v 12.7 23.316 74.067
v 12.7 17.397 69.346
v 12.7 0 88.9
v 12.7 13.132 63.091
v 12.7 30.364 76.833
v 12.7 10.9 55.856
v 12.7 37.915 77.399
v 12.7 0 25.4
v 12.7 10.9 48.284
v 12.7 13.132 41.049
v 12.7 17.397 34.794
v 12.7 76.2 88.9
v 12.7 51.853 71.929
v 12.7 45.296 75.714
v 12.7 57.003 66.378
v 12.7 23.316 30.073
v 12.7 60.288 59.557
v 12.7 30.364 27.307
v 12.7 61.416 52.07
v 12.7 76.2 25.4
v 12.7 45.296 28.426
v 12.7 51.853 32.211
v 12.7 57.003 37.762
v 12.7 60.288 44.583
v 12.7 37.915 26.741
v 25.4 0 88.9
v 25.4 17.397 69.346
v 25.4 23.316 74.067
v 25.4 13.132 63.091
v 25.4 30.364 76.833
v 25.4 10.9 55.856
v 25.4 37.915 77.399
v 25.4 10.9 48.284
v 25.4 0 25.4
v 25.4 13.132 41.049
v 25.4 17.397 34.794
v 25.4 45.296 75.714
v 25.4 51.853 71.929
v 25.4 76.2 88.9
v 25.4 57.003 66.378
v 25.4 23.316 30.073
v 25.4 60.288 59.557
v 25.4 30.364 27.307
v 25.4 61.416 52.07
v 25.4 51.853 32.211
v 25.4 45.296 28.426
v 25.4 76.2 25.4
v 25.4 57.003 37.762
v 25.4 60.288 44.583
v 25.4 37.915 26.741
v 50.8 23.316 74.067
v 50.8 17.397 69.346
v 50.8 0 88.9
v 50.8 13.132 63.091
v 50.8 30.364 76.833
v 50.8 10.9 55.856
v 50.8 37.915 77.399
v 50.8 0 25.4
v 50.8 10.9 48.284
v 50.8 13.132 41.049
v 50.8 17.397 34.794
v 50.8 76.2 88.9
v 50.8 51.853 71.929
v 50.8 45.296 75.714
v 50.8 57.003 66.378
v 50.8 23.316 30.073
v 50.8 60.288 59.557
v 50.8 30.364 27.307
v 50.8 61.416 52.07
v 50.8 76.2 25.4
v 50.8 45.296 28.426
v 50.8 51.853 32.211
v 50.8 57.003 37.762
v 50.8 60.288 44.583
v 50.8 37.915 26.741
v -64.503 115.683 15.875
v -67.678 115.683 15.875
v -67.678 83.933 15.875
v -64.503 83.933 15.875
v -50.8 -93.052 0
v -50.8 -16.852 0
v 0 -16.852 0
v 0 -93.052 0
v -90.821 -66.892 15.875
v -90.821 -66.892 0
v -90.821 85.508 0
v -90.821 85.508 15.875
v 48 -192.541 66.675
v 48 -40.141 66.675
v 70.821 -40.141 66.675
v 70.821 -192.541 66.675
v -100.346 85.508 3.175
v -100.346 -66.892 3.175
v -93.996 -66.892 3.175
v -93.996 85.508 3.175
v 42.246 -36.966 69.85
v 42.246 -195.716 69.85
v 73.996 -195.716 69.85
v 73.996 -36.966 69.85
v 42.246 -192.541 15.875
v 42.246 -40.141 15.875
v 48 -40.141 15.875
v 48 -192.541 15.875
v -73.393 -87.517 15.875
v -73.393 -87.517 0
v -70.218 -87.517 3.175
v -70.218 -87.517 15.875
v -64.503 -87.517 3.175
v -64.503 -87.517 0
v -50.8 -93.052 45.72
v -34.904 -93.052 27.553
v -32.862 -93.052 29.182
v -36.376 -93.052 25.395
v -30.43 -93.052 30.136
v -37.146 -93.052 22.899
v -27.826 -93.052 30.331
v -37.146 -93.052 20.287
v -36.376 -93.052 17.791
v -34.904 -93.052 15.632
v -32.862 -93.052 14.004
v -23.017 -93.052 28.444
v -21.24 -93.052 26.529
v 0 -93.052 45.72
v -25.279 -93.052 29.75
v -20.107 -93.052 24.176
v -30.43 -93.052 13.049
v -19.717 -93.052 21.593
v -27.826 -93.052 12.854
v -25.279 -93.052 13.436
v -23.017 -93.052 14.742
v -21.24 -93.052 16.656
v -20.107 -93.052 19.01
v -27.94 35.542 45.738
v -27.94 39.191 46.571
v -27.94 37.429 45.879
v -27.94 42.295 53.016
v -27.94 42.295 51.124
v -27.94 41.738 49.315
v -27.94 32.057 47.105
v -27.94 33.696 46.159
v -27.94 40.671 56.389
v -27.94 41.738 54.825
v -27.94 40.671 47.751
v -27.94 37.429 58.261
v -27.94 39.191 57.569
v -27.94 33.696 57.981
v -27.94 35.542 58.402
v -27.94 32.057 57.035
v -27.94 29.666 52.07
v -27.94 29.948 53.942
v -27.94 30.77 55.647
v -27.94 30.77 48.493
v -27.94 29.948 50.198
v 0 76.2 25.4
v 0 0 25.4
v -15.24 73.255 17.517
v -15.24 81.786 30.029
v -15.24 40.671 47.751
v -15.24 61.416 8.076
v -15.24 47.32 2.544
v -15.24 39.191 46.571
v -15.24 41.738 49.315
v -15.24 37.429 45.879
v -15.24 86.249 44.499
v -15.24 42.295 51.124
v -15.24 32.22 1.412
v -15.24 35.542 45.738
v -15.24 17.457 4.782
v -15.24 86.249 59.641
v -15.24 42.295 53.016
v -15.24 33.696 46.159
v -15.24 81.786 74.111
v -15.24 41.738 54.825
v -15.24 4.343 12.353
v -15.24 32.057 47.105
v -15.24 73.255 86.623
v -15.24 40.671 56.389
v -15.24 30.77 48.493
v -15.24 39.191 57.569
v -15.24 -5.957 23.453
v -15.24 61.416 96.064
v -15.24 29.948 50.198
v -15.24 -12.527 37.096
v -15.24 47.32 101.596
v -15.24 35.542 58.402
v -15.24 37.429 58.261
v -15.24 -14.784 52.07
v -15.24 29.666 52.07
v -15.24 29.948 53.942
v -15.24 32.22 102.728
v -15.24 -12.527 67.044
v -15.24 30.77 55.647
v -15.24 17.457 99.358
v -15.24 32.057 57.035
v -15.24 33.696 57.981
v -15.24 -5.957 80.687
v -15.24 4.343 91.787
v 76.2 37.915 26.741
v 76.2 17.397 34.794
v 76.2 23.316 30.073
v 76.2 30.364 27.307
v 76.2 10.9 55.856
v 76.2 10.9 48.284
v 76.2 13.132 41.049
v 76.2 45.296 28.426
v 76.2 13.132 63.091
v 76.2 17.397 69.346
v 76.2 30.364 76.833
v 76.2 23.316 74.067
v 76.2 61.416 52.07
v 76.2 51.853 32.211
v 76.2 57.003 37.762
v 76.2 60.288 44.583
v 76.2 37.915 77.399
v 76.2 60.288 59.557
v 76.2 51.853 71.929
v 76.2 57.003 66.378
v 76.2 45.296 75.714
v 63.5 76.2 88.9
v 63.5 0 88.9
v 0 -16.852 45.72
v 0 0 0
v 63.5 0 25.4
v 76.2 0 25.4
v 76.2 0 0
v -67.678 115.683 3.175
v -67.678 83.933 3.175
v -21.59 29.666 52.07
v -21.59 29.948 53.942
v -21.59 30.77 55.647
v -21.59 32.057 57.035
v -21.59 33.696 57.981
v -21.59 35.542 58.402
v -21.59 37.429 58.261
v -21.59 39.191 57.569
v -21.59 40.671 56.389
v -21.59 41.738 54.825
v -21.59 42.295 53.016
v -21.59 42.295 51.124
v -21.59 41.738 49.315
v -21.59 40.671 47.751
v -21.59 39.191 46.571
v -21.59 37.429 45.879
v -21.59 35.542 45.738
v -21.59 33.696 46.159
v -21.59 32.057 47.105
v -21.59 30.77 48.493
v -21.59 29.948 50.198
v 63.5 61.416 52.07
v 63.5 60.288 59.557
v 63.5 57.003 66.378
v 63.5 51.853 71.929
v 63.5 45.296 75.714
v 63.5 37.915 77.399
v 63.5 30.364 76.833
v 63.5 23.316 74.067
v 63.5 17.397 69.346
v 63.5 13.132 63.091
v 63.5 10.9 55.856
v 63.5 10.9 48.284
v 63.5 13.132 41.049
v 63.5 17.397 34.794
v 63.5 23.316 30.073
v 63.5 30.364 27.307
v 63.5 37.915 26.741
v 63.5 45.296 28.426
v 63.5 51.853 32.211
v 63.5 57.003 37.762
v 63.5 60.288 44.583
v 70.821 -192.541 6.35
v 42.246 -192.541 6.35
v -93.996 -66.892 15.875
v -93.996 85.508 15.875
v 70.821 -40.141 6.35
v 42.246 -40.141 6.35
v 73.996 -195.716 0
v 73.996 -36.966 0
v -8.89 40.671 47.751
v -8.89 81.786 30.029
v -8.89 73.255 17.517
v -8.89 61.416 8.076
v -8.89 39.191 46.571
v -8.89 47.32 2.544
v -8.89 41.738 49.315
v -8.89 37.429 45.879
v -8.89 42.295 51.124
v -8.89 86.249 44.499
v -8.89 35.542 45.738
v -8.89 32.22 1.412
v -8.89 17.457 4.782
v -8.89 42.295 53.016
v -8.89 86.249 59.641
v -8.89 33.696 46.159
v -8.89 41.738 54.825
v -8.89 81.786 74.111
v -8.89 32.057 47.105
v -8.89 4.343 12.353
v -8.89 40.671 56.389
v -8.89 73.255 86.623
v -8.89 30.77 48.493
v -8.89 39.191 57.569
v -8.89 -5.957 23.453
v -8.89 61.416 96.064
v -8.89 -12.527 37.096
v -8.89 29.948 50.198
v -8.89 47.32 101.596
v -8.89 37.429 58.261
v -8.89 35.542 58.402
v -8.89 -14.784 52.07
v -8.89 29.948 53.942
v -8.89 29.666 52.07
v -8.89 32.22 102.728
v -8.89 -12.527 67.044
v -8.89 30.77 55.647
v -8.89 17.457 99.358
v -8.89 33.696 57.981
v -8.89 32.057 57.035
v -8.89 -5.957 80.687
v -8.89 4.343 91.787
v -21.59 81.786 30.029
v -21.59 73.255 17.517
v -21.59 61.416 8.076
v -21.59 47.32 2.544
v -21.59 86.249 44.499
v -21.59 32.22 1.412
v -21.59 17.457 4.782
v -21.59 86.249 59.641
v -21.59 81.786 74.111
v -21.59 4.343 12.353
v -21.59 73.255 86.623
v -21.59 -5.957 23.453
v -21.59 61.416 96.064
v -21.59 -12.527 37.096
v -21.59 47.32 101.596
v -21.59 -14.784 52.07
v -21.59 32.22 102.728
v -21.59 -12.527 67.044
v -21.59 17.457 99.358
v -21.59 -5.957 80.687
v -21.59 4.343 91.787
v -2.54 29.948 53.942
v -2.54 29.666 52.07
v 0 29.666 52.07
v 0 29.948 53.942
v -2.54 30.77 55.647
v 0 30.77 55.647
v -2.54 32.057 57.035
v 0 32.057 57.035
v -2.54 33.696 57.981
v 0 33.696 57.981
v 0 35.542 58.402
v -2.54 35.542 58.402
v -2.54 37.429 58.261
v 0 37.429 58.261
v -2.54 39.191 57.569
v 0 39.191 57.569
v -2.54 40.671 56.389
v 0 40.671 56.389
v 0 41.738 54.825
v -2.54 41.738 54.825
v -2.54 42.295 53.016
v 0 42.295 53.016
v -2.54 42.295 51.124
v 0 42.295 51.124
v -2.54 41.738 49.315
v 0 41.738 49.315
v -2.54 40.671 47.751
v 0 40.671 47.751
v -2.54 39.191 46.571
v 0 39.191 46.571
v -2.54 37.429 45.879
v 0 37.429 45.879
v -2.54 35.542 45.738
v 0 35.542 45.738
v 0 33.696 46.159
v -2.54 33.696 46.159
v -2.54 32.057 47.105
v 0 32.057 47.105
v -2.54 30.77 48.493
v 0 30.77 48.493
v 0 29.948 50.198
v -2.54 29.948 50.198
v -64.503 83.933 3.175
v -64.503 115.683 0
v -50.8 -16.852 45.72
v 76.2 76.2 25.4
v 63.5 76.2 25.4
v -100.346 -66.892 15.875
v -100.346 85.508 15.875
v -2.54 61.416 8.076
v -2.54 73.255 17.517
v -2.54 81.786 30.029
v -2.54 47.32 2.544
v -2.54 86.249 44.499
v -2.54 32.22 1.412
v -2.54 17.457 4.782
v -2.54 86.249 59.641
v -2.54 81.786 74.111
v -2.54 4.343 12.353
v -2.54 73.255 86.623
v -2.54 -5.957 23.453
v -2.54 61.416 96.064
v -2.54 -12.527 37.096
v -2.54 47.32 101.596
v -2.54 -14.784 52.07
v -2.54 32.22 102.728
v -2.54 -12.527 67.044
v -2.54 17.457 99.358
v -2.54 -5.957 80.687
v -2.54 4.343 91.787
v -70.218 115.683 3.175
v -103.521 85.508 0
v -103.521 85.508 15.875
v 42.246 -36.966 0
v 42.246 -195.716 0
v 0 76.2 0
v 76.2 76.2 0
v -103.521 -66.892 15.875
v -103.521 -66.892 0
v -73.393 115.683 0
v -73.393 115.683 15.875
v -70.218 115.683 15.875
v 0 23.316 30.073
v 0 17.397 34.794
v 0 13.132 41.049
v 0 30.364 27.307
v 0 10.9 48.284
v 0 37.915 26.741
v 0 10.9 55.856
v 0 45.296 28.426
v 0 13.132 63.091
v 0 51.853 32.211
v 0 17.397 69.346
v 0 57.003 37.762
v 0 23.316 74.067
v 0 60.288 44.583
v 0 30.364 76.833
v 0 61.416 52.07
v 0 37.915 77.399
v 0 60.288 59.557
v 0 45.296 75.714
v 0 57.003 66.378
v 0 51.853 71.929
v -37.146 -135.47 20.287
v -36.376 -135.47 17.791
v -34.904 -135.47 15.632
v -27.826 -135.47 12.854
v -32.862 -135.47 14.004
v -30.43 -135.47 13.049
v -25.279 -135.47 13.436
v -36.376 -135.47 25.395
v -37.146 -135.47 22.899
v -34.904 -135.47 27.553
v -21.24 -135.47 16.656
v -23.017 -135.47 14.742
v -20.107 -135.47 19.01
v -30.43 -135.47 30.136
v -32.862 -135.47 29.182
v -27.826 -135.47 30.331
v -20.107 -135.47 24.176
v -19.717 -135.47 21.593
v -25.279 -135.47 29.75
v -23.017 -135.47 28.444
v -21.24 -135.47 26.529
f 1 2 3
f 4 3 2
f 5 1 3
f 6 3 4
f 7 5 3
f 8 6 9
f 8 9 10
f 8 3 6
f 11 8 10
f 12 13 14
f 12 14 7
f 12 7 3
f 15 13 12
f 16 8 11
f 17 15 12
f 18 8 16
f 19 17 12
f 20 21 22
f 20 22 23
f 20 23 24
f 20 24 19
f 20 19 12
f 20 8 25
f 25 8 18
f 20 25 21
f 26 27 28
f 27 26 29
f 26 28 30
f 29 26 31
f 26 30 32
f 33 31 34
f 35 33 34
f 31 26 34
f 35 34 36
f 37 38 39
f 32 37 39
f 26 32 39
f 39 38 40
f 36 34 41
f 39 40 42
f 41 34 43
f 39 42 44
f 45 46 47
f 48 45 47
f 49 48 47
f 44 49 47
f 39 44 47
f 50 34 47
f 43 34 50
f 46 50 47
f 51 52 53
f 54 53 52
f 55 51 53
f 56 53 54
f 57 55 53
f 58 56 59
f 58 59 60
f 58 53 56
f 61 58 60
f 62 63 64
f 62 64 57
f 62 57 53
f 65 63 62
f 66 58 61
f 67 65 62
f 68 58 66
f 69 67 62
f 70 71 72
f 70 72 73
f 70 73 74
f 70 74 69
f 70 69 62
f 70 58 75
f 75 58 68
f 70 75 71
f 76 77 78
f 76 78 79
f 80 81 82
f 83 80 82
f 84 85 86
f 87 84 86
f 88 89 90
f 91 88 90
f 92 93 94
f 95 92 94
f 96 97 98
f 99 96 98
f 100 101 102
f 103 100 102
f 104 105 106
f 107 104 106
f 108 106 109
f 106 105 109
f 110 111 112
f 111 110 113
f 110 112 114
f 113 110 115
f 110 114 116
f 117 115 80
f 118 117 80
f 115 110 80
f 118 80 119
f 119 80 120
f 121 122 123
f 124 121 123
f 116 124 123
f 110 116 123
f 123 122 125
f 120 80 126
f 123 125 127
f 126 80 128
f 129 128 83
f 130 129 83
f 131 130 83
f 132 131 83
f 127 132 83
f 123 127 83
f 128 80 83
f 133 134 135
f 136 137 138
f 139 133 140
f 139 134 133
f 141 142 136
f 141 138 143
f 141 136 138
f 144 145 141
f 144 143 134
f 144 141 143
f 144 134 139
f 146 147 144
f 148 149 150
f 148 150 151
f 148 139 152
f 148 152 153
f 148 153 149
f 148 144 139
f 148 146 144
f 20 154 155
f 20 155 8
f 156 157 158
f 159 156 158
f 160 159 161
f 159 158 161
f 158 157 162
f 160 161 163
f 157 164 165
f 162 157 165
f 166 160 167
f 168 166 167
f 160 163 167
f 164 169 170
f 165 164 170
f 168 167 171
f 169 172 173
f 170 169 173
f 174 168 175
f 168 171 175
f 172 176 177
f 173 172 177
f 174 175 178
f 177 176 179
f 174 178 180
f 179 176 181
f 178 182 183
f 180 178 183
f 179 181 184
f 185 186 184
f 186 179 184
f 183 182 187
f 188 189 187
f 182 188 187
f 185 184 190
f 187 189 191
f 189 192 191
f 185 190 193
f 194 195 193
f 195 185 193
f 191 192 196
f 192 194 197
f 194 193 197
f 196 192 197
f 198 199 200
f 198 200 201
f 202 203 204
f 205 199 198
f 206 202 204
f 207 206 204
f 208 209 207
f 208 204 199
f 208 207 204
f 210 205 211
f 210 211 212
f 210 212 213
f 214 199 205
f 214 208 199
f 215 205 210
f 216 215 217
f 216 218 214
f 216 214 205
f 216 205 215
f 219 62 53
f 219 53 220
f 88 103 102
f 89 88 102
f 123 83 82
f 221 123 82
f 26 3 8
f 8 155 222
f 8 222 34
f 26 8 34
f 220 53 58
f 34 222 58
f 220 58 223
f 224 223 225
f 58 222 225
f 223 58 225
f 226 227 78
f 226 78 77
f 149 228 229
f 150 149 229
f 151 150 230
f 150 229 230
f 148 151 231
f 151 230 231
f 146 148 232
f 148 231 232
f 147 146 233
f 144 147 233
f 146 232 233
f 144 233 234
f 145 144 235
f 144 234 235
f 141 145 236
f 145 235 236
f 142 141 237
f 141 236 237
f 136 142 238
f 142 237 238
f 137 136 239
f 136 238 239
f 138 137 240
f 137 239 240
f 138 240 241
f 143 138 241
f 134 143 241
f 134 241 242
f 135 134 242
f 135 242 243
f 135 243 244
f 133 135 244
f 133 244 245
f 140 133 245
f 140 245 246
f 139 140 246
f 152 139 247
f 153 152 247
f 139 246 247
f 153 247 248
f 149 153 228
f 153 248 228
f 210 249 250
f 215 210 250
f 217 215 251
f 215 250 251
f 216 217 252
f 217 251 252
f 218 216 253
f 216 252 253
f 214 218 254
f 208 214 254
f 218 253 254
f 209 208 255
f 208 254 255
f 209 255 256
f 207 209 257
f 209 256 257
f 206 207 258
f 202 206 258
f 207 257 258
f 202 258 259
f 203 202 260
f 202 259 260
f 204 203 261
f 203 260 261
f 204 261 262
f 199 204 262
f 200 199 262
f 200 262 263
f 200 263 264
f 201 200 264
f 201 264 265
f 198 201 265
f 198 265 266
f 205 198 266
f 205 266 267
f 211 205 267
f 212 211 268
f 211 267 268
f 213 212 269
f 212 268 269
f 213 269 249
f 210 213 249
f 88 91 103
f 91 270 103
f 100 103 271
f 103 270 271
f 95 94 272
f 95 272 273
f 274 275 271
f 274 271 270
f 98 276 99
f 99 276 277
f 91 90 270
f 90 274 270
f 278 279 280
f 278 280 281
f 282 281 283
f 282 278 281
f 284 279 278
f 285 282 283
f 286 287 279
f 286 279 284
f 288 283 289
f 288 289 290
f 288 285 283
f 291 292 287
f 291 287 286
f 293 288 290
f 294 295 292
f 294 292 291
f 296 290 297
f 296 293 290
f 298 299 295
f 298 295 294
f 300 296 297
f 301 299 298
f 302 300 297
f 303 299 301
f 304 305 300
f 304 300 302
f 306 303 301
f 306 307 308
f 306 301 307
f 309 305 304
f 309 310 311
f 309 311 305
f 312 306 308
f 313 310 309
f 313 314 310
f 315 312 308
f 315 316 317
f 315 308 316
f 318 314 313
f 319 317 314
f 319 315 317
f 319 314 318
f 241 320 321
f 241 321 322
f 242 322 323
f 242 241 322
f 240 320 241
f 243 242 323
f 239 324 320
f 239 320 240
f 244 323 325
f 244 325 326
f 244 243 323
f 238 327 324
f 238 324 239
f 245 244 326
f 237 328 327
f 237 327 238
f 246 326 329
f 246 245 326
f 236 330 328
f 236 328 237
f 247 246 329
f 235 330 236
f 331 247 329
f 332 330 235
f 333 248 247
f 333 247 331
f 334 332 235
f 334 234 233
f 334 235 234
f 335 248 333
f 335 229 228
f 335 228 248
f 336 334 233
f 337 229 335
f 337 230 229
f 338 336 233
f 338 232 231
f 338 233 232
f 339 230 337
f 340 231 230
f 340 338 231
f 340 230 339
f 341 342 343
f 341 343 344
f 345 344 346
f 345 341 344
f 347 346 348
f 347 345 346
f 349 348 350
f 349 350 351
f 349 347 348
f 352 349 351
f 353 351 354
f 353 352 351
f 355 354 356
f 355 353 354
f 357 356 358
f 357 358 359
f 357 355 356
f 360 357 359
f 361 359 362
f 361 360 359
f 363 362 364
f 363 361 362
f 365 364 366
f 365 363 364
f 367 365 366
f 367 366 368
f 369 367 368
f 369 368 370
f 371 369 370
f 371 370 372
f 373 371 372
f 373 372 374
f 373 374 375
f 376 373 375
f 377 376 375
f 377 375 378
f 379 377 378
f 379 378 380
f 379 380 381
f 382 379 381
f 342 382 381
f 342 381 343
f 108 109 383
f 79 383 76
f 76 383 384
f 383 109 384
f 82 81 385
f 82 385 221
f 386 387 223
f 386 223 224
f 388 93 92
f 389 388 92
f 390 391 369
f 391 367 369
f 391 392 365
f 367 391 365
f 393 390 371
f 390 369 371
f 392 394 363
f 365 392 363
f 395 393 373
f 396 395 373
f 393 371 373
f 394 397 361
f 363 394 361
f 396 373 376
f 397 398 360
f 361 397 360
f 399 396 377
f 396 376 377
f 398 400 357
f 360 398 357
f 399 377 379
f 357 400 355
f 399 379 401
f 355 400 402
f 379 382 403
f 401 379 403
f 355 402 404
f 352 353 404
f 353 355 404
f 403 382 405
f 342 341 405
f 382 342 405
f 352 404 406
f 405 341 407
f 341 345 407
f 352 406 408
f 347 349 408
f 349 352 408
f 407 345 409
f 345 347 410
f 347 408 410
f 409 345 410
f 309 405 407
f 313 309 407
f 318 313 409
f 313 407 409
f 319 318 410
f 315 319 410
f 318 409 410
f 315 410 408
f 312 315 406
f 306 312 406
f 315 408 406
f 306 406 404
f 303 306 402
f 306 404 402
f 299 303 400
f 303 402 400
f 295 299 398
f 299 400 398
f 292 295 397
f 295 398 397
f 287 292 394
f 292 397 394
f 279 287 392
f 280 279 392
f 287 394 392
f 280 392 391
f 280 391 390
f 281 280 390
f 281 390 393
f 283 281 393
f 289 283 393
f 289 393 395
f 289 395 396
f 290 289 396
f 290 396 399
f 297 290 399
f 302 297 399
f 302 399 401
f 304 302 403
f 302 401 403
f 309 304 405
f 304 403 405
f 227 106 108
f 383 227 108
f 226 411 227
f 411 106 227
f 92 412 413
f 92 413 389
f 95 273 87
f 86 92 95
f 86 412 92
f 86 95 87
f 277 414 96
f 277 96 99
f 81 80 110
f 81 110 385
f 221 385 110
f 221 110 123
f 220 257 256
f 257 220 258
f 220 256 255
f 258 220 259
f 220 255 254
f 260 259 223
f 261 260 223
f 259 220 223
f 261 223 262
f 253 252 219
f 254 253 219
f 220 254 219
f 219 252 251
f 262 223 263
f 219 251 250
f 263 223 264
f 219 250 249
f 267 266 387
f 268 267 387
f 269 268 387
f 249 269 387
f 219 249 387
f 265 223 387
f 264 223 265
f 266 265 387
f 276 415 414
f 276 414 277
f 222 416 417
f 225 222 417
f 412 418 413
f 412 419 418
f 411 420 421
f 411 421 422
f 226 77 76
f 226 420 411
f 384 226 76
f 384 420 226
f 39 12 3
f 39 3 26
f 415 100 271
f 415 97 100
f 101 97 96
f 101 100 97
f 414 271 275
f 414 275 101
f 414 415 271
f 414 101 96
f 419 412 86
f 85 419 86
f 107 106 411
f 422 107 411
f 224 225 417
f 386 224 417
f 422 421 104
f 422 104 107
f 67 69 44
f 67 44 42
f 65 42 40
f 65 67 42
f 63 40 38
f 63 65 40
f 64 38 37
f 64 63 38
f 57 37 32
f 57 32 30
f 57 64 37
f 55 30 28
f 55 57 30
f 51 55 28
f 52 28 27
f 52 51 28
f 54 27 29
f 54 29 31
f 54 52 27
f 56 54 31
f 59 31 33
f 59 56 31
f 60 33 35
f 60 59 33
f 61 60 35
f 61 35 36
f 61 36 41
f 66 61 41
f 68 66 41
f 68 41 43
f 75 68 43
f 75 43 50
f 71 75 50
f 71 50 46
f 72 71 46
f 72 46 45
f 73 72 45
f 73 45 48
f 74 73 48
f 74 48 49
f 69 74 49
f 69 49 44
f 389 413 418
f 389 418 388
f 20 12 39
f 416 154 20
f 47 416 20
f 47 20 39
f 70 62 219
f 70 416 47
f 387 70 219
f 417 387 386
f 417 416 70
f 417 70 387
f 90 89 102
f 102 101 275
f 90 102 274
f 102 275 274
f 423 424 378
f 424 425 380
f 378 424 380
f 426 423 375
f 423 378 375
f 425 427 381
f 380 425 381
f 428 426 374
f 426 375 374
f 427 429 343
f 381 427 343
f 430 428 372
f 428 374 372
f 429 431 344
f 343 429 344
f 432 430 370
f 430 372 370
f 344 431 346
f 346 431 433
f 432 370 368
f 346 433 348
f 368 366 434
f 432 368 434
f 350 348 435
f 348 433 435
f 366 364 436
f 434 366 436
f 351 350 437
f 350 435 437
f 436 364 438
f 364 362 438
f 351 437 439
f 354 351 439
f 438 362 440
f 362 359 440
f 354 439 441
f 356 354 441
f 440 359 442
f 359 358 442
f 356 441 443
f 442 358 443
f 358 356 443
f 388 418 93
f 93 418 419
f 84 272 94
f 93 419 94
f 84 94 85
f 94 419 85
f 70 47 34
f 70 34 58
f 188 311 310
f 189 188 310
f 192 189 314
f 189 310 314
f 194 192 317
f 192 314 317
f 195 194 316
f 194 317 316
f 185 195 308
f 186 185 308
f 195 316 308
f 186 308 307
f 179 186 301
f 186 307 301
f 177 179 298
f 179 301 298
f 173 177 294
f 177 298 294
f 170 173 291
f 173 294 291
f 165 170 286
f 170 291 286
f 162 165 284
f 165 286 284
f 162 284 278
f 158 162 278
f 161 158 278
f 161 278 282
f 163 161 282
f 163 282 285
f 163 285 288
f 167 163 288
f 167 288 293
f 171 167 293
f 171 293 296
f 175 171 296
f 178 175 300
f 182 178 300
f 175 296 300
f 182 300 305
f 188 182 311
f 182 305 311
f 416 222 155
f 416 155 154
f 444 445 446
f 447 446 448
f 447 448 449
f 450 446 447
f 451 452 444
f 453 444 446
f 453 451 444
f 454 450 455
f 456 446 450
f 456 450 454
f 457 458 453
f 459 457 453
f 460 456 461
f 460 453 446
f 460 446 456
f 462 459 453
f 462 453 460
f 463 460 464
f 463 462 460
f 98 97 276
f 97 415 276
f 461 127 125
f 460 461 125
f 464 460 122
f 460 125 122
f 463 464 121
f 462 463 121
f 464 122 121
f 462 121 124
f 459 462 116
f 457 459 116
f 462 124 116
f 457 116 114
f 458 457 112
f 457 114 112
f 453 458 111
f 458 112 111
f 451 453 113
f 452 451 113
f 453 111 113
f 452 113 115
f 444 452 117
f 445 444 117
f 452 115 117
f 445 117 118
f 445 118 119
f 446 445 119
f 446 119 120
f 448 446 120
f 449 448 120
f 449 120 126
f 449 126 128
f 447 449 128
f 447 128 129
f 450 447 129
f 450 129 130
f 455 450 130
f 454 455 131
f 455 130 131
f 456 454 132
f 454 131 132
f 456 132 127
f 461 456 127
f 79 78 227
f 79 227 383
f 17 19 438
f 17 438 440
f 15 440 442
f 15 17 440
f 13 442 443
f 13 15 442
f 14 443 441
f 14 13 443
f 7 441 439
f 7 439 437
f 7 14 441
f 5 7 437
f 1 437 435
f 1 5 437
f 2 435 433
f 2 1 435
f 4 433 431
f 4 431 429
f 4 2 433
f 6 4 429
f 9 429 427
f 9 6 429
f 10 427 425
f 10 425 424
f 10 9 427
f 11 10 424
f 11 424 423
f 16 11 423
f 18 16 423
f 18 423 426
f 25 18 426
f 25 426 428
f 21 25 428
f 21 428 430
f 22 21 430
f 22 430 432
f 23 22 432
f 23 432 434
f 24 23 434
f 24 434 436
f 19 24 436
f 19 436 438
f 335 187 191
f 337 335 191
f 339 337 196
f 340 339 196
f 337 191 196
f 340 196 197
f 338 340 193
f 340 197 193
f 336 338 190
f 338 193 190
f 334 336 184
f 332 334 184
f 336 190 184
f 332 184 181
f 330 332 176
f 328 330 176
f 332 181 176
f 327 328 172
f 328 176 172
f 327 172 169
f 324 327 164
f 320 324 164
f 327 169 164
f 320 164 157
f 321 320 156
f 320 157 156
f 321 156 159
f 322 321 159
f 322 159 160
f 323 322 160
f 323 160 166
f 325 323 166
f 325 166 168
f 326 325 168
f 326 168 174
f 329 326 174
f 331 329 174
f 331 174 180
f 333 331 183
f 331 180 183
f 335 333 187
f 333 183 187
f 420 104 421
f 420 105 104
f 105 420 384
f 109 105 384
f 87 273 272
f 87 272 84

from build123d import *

# Parameters (mm, degrees)
F0_W           = 76.2
F0_H           = 76.2
F1_DEPTH       = 25.4
F2_W           = 12.7
F2_H           = 76.2
F3_DEPTH       = 63.5
F4_R           = 25.4
F5_DEPTH       = 12.7
F5_DEPTH_BACK  = 63.5
F6_R           = 3.175
F7_DEPTH       = 2.54
F8_R           = 50.8
F8_R_2         = 3.175
F9_DEPTH       = 6.35
F10_R          = 6.35
F11_DEPTH      = 6.35
F11_DEPTH_BACK = 25.4
F12_R          = 50.8
F12_R_2        = 6.35
F13_DEPTH      = 6.35
F14_R          = 6.35
F15_DEPTH      = 6.35
F15_DEPTH_BACK = 25.4
F16_W          = 8.89
F16_H          = 203.2
F17_DEPTH      = 3.175
F18_W          = 3.175
F18_H          = 203.2
F19_DEPTH      = 12.7
F20_W          = 50.8
F20_H          = 76.2
F21_DEPTH      = 45.72
F22_R          = 8.763
F23_DEPTH      = 42.418
F24_W          = 31.75
F24_H          = 158.75
F25_DEPTH      = 6.35
F27_DEPTH      = 9.525
F28_W          = 5.75394319
F28_H          = 152.4
F29_DEPTH      = 50.8
F30_W          = 31.75
F30_H          = 158.75
F30_W_2        = 22.82105681
F30_H_2        = 152.4
F31_DEPTH      = 3.175
F32_W          = 3.175
F32_H          = 171.45
F33_DEPTH      = 12.7
F34_W          = 12.7
F34_H          = 152.4
F35_DEPTH      = 3.175
F36_W          = 3.175
F36_H          = 152.4
F37_DEPTH      = 12.7


with BuildPart() as f1:
    # F0 (on Top) → F1 (new body)
    with BuildSketch(Plane.XY):
        with Locations((38.1, 38.1)):
            Rectangle(F0_W, F0_H)
    extrude(amount=F1_DEPTH)

    # F2 (on face) → F3 (join)
    with BuildSketch(Plane.XY.offset(25.4)):
        with Locations((57.15, 38.1)):
            Rectangle(F2_W, F2_H)
        with Locations((19.05, 38.1)):
            Rectangle(F2_W, F2_H)
    extrude(amount=F3_DEPTH)

    # F4 (on face) → F5 (join, two sides)
    with BuildSketch(Plane.YZ.offset(63.5)) as f5_sk:
        with Locations((36.0163860023, 52.07)):
            Circle(F4_R)
    extrude(amount=F5_DEPTH)
    extrude(f5_sk.sketch, amount=-F5_DEPTH_BACK)

    # F6 (on face) → F7 (join)
    with BuildSketch(Plane(origin=(0, 0, 0), x_dir=(0, -1, 0), z_dir=(-1, 0, 0))):
        with Locations((-36.0163860023, 52.07)):
            Circle(F6_R)
    extrude(amount=F7_DEPTH)

    # F8 (on face) → F9 (join)
    with BuildSketch(Plane(origin=(-2.54, 0, 0), x_dir=(0, -1, 0), z_dir=(-1, 0, 0))):
        with Locations((-36.0163860023, 52.07)):
            Circle(F8_R)
        with Locations((-36.0163860023, 52.07)):
            Circle(F8_R_2, mode=Mode.SUBTRACT)
        with Locations((-36.0163860023, 52.07)):
            Circle(F8_R_2)
    extrude(amount=F9_DEPTH)

    # F10 (on face) → F11 (join, two sides)
    with BuildSketch(Plane(origin=(-8.89, 0, 0), x_dir=(0, -1, 0), z_dir=(-1, 0, 0))) as f11_sk:
        with Locations((-36.0163860023, 52.07)):
            Circle(F10_R)
    extrude(amount=F11_DEPTH)
    extrude(f11_sk.sketch, amount=-F11_DEPTH_BACK)

    # F12 (on face) → F13 (join)
    with BuildSketch(Plane(origin=(-15.24, 0, 0), x_dir=(0, -1, 0), z_dir=(-1, 0, 0))):
        with Locations((-36.0163860023, 52.07)):
            Circle(F12_R)
        with Locations((-36.0163860023, 52.07)):
            Circle(F12_R_2, mode=Mode.SUBTRACT)
        with Locations((-36.0163860023, 52.07)):
            Circle(F12_R_2)
    extrude(amount=F13_DEPTH)

    # F14 (on face) → F15 (join, two sides)
    with BuildSketch(Plane(origin=(-21.59, 0, 0), x_dir=(0, -1, 0), z_dir=(-1, 0, 0))) as f15_sk:
        with Locations((-36.0163860023, 52.07)):
            Circle(F14_R)
    extrude(amount=F15_DEPTH)
    extrude(f15_sk.sketch, amount=-F15_DEPTH_BACK)


with BuildPart() as f17:
    # F16 (on Top) → F17 (new body)
    with BuildSketch(Plane.XY):
        with Locations((-68.9478659696, 14.0829309821)):
            Rectangle(F16_W, F16_H)
    extrude(amount=F17_DEPTH)

    # F18 (on face) → F19 (join)
    with BuildSketch(Plane.XY.offset(3.175)):
        with Locations((-71.8053659696, 14.0829309821)):
            Rectangle(F18_W, F18_H)
        with Locations((-66.0903659696, 14.0829309821)):
            Rectangle(F18_W, F18_H)
    extrude(amount=F19_DEPTH)

    # F32 (on face) → F33 (cut)
    with BuildSketch(Plane.XY.offset(15.875)):
        with Locations((-66.0903659696, -1.7920690179)):
            Rectangle(F32_W, F32_H)
    extrude(amount=-F33_DEPTH, mode=Mode.SUBTRACT)


with BuildPart() as f21:
    # F20 (on Top) → F21 (new body)
    with BuildSketch(Plane.XY):
        with Locations((-25.4, -54.9523236941)):
            Rectangle(F20_W, F20_H)
    extrude(amount=F21_DEPTH)

    # F22 (on face) → F23 (join)
    with BuildSketch(Plane.XZ.offset(93.0523236941)):
        with Locations((-28.4804850817, 21.5927474201)):
            Circle(F22_R)
    extrude(amount=F23_DEPTH)


with BuildPart() as f25:
    # F24 (on Top) → F25 (new body)
    with BuildSketch(Plane.XY):
        with Locations((58.1205990165, -116.3411861461)):
            Rectangle(F24_W, F24_H)
    extrude(amount=F25_DEPTH)

    # F26 (on face) → F27 (join)
    with BuildSketch(Plane.XY.offset(6.35)):
        Polygon((70.8205990165, -192.5411861461), (45.4205990165, -192.5411861461), (42.2455990165, -192.5411861461), (42.2455990165, -195.7161861461), (73.9955990165, -195.7161861461), (73.9955990165, -36.9661861461), (42.2455990165, -36.9661861461), (42.2455990165, -40.1411861461), (45.4205990165, -40.1411861461), (70.8205990165, -40.1411861461), align=None)
    extrude(amount=F27_DEPTH)

    # F28 (on face) → F29 (join)
    with BuildSketch(Plane.XY.offset(15.875)):
        with Locations((45.1225706115, -116.3411861461)):
            Rectangle(F28_W, F28_H)
        Polygon((42.2455990165, -192.5411861461), (42.2455990165, -195.7161861461), (73.9955990165, -195.7161861461), (73.9955990165, -36.9661861461), (42.2455990165, -36.9661861461), (42.2455990165, -40.1411861461), (47.9995422065, -40.1411861461), (70.8205990165, -40.1411861461), (70.8205990165, -192.5411861461), (47.9995422065, -192.5411861461), align=None)
    extrude(amount=F29_DEPTH)

    # F30 (on face) → F31 (join)
    with BuildSketch(Plane.XY.offset(66.675)):
        with Locations((58.1205990165, -116.3411861461)):
            Rectangle(F30_W, F30_H)
        with Locations((59.4100706115, -116.3411861461)):
            Rectangle(F30_W_2, F30_H_2, mode=Mode.SUBTRACT)
        with Locations((59.4100706115, -116.3411861461)):
            Rectangle(F30_W_2, F30_H_2)
    extrude(amount=F31_DEPTH)


with BuildPart() as f35:
    # F34 (on Top) → F35 (new body)
    with BuildSketch(Plane.XY):
        with Locations((-97.170727649, 9.307641536)):
            Rectangle(F34_W, F34_H)
    extrude(amount=F35_DEPTH)

    # F36 (on face) → F37 (join)
    with BuildSketch(Plane.XY.offset(3.175)):
        with Locations((-101.933227649, 9.307641536)):
            Rectangle(F36_W, F36_H)
        with Locations((-92.408227649, 9.307641536)):
            Rectangle(F36_W, F36_H)
    extrude(amount=F37_DEPTH)


solid = Compound([f1.part, f17.part, f21.part, f25.part, f35.part])
